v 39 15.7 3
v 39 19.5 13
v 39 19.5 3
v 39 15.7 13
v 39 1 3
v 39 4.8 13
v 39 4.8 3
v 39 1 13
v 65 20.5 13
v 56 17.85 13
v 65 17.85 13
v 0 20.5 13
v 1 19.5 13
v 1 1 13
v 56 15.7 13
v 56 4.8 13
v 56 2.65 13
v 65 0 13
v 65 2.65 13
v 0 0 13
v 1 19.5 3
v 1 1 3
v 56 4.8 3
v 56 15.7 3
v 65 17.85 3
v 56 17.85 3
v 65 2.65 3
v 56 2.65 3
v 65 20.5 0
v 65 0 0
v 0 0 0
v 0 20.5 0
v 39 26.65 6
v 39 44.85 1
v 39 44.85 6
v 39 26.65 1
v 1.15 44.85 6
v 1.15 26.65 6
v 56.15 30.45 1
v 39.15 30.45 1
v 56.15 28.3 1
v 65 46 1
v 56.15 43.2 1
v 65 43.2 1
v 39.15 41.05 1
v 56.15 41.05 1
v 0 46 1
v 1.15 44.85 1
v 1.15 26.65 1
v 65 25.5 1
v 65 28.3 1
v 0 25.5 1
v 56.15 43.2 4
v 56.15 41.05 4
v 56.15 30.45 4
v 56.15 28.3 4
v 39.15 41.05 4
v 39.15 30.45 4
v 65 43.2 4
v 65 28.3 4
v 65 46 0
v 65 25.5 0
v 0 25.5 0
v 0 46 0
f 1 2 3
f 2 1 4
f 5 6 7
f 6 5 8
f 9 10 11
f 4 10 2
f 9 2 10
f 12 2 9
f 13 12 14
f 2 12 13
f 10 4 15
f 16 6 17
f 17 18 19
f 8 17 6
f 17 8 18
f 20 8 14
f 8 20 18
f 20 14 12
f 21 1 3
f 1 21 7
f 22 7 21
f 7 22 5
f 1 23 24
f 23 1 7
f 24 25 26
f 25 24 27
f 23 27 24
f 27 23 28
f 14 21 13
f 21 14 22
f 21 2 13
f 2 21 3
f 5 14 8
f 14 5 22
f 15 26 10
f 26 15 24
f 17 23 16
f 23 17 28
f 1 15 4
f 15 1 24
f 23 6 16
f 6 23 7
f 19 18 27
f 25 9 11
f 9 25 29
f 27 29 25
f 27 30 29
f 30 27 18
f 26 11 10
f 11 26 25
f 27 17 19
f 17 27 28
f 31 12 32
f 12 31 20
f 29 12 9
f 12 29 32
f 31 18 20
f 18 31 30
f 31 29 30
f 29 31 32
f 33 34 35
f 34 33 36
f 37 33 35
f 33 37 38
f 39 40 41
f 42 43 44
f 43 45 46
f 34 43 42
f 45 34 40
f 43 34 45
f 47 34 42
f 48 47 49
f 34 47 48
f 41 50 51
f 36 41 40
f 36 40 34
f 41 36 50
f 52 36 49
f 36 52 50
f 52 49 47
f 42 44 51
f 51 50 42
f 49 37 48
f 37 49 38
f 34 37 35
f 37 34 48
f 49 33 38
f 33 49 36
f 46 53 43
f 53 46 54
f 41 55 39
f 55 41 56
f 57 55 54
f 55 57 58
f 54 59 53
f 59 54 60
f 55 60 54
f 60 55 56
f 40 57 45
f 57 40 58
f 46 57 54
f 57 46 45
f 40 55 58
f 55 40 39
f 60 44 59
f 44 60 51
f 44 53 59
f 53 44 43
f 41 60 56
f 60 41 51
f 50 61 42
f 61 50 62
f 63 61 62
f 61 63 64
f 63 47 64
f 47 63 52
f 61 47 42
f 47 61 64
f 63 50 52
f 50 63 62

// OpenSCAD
// Gemeinsame Parameter für beide Module
laenge = 64;    // von 60 auf 62 erhöht
breite_hinten = 18.5;  
breite_vorne = 15.2;   
wandstaerke = 1;   
bodenstaerke = 3;
hoehe = 10;

// Verdickungsparameter
verdickung_abstand = 38;    
verdickung_laenge = 17;     
verdickung_tiefe = 3.8;
verdickung_ende = verdickung_abstand + verdickung_laenge;

// Deckelparameter
deckel_hoehe = 1;
praegung_hoehe = 3;
praegung_hoehe_hinten = 5;

// Presspassung - negative Werte = enger, positive = lockerer
presspassung = 0.15;  // Anpassen für straffere/lockere Passung

// Äußere Breite
aussen_breite = breite_hinten + (2 * wandstaerke);

// Modul für das U-Profil
module u_profil() {
    union() {
        // Boden
        cube([laenge + wandstaerke, aussen_breite, bodenstaerke]);
        
        difference() {
            // Äußerer Block für alle Wände
            translate([0, 0, bodenstaerke])
                cube([laenge + wandstaerke, aussen_breite, hoehe]);
            
            // Innere Ausschnitte
            translate([wandstaerke, wandstaerke, bodenstaerke]) {
                // Ausschnitt bis zur Verdickung
                cube([verdickung_abstand, breite_hinten, hoehe]);
                
                // Ausschnitt im Bereich der Verdickung
                translate([verdickung_abstand, verdickung_tiefe, 0])
                    cube([verdickung_laenge, breite_hinten - (2 * verdickung_tiefe), hoehe]);
                
                // Ausschnitt nach der Verdickung
                translate([verdickung_ende, (breite_hinten - breite_vorne) / 2, 0])
                    cube([laenge - verdickung_ende, breite_vorne, hoehe]);
            }
        }
    }
}

// Modul für den Deckel
module deckel() {
    union() {
        // Deckelplatte
        cube([laenge + wandstaerke, aussen_breite, deckel_hoehe]);
        
        // Männliche Prägung (nach oben)
        translate([wandstaerke + presspassung, wandstaerke + presspassung, deckel_hoehe]) {
            union() {
                // Hinterer Bereich (mit anderer Höhe)
                cube([verdickung_abstand - presspassung, breite_hinten - (2 * presspassung), praegung_hoehe_hinten]);
                
                // Mittlerer Bereich (mit Verdickung)
                translate([verdickung_abstand, verdickung_tiefe, 0])
                    cube([verdickung_laenge, breite_hinten - (2 * verdickung_tiefe) - (2 * presspassung), praegung_hoehe]);
                
                // Vorderer Bereich
                translate([verdickung_ende, (breite_hinten - breite_vorne) / 2, 0])
                    cube([laenge - verdickung_ende - presspassung, breite_vorne - (2 * presspassung), praegung_hoehe]);
            }
        }
    }
}

// Platzierung der Module nebeneinander mit 5mm Abstand
u_profil();
translate([0, aussen_breite + 5, 0]) deckel();
